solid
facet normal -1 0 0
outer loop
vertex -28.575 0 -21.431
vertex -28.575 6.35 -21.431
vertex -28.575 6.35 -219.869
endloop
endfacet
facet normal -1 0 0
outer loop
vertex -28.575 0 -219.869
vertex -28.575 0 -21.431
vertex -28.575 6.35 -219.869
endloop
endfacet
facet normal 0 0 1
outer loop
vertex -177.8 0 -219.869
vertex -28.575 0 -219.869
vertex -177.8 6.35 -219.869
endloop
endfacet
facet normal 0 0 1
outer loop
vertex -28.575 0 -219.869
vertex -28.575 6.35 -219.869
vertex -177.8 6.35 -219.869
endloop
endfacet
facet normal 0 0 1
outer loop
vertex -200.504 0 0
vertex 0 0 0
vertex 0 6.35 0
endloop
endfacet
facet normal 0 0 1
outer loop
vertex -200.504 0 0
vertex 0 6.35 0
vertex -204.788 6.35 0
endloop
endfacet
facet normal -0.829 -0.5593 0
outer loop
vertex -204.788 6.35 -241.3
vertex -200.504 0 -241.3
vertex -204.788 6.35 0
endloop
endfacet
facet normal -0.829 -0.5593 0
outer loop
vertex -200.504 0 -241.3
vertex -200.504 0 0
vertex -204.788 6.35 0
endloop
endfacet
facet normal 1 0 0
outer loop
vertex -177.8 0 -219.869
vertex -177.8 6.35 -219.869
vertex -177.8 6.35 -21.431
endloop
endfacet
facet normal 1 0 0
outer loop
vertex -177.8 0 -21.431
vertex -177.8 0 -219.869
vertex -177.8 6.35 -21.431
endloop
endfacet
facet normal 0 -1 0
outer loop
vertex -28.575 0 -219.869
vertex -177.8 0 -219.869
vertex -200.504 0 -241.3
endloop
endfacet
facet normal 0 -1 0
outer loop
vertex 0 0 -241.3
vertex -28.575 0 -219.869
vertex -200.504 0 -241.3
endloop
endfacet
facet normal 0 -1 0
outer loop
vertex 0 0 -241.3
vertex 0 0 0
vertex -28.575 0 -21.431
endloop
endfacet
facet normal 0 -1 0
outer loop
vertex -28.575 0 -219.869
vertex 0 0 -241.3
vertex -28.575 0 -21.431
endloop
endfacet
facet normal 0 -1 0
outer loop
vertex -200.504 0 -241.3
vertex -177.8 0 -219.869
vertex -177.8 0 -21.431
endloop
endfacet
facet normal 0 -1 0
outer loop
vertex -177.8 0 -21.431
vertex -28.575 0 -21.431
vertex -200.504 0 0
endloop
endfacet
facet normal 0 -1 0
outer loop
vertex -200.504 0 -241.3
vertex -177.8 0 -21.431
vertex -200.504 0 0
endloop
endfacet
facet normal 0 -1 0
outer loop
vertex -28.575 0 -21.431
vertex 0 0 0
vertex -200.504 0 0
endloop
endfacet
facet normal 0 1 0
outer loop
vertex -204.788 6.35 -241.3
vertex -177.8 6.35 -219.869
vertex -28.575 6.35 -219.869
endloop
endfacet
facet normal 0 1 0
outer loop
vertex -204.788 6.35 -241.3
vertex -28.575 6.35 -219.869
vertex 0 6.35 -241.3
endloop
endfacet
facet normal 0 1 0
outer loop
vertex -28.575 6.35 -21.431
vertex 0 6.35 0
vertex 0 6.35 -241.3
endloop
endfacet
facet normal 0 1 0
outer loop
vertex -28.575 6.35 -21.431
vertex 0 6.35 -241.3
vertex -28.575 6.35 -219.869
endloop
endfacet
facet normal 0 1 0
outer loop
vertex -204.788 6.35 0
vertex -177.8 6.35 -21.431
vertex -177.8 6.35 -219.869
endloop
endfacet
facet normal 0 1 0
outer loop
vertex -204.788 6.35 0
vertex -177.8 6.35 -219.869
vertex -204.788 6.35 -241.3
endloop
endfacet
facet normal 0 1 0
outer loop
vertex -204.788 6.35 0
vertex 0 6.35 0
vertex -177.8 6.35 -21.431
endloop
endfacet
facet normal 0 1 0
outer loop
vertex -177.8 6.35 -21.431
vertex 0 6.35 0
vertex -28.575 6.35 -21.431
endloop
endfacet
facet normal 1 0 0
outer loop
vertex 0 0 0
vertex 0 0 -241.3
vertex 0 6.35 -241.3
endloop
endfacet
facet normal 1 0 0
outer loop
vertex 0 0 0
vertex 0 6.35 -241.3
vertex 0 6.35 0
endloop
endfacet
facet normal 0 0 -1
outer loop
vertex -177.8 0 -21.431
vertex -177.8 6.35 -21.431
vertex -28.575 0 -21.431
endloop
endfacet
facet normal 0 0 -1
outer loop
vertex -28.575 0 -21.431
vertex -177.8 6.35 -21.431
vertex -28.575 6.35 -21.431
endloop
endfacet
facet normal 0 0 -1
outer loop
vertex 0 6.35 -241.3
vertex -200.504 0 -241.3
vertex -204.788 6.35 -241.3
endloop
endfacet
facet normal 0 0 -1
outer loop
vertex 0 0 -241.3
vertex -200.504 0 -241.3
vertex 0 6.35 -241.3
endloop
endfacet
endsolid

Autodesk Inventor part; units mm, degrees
ref_plane "YZ Plane" through (0, 0, 0) normal (1, 0, 0) x (0, 1, 0)
ref_plane "XZ Plane" through (0, 0, 0) normal (0, 1, 0) x (-1, 0, 0)
ref_plane "XY Plane" through (0, 0, 0) normal (0, 0, 1) x (1, 0, 0)
sketch "Sketch1" plane through (0, 0, 0) normal (0, 1, 0) x (-1, 0, 0)
  line L0 (0, 0) -> (204.7875, 0)
  line L1 (204.7875, 0) -> (204.7875, -241.3)
  line L2 (204.7875, -241.3) -> (0, -241.3)
  line L3 (0, -241.3) -> (0, 0)
  dimension "d0" = 204.7875
  dimension "d1" = 241.3
extrude "Extrusion1" add sketch "Sketch1" along normal blind 6.35
sketch "Sketch2" plane through (0, 6.35, 0) normal (0, 1, 0) x (1, 0, 0)
  line L0 (-28.575, 219.8688) -> (-177.8, 219.8688)
  line L1 (-177.8, 219.8688) -> (-177.8, 21.4312)
  line L2 (-177.8, 21.4312) -> (-28.575, 21.4313)
  line L3 (-28.575, 21.4313) -> (-28.575, 219.8688)
  line L4 (0, 0) -> (-204.7875, 0) projected
  line L5 (-204.7875, 241.3) -> (-204.7875, 0) projected
  dimension "d4" = 149.225
  dimension "d5" = 198.4375
  dimension "d6" = 21.4312
  dimension "d7" = 26.9875
extrude "Extrusion2" cut sketch "Sketch2" against normal blind 25.4
sketch "Sketch4" plane through (-204.7875, 0, 0) normal (0, 0, 1) x (1, 0, 0)
  line L0 (4.2831, 0) -> (-0.0504, 6.4246) projected
  line L1 (0, 0) -> (0, 6.35) projected
  line L2 (204.7875, 0) -> (0, 0) projected
  line L3 (0, 6.35) -> (0, 0)
  line L4 (0, 0) -> (4.2831, 0)
extrude "Extrusion4" cut sketch "Sketch4" against normal blind 241.3
properties part number "screen_holder"
